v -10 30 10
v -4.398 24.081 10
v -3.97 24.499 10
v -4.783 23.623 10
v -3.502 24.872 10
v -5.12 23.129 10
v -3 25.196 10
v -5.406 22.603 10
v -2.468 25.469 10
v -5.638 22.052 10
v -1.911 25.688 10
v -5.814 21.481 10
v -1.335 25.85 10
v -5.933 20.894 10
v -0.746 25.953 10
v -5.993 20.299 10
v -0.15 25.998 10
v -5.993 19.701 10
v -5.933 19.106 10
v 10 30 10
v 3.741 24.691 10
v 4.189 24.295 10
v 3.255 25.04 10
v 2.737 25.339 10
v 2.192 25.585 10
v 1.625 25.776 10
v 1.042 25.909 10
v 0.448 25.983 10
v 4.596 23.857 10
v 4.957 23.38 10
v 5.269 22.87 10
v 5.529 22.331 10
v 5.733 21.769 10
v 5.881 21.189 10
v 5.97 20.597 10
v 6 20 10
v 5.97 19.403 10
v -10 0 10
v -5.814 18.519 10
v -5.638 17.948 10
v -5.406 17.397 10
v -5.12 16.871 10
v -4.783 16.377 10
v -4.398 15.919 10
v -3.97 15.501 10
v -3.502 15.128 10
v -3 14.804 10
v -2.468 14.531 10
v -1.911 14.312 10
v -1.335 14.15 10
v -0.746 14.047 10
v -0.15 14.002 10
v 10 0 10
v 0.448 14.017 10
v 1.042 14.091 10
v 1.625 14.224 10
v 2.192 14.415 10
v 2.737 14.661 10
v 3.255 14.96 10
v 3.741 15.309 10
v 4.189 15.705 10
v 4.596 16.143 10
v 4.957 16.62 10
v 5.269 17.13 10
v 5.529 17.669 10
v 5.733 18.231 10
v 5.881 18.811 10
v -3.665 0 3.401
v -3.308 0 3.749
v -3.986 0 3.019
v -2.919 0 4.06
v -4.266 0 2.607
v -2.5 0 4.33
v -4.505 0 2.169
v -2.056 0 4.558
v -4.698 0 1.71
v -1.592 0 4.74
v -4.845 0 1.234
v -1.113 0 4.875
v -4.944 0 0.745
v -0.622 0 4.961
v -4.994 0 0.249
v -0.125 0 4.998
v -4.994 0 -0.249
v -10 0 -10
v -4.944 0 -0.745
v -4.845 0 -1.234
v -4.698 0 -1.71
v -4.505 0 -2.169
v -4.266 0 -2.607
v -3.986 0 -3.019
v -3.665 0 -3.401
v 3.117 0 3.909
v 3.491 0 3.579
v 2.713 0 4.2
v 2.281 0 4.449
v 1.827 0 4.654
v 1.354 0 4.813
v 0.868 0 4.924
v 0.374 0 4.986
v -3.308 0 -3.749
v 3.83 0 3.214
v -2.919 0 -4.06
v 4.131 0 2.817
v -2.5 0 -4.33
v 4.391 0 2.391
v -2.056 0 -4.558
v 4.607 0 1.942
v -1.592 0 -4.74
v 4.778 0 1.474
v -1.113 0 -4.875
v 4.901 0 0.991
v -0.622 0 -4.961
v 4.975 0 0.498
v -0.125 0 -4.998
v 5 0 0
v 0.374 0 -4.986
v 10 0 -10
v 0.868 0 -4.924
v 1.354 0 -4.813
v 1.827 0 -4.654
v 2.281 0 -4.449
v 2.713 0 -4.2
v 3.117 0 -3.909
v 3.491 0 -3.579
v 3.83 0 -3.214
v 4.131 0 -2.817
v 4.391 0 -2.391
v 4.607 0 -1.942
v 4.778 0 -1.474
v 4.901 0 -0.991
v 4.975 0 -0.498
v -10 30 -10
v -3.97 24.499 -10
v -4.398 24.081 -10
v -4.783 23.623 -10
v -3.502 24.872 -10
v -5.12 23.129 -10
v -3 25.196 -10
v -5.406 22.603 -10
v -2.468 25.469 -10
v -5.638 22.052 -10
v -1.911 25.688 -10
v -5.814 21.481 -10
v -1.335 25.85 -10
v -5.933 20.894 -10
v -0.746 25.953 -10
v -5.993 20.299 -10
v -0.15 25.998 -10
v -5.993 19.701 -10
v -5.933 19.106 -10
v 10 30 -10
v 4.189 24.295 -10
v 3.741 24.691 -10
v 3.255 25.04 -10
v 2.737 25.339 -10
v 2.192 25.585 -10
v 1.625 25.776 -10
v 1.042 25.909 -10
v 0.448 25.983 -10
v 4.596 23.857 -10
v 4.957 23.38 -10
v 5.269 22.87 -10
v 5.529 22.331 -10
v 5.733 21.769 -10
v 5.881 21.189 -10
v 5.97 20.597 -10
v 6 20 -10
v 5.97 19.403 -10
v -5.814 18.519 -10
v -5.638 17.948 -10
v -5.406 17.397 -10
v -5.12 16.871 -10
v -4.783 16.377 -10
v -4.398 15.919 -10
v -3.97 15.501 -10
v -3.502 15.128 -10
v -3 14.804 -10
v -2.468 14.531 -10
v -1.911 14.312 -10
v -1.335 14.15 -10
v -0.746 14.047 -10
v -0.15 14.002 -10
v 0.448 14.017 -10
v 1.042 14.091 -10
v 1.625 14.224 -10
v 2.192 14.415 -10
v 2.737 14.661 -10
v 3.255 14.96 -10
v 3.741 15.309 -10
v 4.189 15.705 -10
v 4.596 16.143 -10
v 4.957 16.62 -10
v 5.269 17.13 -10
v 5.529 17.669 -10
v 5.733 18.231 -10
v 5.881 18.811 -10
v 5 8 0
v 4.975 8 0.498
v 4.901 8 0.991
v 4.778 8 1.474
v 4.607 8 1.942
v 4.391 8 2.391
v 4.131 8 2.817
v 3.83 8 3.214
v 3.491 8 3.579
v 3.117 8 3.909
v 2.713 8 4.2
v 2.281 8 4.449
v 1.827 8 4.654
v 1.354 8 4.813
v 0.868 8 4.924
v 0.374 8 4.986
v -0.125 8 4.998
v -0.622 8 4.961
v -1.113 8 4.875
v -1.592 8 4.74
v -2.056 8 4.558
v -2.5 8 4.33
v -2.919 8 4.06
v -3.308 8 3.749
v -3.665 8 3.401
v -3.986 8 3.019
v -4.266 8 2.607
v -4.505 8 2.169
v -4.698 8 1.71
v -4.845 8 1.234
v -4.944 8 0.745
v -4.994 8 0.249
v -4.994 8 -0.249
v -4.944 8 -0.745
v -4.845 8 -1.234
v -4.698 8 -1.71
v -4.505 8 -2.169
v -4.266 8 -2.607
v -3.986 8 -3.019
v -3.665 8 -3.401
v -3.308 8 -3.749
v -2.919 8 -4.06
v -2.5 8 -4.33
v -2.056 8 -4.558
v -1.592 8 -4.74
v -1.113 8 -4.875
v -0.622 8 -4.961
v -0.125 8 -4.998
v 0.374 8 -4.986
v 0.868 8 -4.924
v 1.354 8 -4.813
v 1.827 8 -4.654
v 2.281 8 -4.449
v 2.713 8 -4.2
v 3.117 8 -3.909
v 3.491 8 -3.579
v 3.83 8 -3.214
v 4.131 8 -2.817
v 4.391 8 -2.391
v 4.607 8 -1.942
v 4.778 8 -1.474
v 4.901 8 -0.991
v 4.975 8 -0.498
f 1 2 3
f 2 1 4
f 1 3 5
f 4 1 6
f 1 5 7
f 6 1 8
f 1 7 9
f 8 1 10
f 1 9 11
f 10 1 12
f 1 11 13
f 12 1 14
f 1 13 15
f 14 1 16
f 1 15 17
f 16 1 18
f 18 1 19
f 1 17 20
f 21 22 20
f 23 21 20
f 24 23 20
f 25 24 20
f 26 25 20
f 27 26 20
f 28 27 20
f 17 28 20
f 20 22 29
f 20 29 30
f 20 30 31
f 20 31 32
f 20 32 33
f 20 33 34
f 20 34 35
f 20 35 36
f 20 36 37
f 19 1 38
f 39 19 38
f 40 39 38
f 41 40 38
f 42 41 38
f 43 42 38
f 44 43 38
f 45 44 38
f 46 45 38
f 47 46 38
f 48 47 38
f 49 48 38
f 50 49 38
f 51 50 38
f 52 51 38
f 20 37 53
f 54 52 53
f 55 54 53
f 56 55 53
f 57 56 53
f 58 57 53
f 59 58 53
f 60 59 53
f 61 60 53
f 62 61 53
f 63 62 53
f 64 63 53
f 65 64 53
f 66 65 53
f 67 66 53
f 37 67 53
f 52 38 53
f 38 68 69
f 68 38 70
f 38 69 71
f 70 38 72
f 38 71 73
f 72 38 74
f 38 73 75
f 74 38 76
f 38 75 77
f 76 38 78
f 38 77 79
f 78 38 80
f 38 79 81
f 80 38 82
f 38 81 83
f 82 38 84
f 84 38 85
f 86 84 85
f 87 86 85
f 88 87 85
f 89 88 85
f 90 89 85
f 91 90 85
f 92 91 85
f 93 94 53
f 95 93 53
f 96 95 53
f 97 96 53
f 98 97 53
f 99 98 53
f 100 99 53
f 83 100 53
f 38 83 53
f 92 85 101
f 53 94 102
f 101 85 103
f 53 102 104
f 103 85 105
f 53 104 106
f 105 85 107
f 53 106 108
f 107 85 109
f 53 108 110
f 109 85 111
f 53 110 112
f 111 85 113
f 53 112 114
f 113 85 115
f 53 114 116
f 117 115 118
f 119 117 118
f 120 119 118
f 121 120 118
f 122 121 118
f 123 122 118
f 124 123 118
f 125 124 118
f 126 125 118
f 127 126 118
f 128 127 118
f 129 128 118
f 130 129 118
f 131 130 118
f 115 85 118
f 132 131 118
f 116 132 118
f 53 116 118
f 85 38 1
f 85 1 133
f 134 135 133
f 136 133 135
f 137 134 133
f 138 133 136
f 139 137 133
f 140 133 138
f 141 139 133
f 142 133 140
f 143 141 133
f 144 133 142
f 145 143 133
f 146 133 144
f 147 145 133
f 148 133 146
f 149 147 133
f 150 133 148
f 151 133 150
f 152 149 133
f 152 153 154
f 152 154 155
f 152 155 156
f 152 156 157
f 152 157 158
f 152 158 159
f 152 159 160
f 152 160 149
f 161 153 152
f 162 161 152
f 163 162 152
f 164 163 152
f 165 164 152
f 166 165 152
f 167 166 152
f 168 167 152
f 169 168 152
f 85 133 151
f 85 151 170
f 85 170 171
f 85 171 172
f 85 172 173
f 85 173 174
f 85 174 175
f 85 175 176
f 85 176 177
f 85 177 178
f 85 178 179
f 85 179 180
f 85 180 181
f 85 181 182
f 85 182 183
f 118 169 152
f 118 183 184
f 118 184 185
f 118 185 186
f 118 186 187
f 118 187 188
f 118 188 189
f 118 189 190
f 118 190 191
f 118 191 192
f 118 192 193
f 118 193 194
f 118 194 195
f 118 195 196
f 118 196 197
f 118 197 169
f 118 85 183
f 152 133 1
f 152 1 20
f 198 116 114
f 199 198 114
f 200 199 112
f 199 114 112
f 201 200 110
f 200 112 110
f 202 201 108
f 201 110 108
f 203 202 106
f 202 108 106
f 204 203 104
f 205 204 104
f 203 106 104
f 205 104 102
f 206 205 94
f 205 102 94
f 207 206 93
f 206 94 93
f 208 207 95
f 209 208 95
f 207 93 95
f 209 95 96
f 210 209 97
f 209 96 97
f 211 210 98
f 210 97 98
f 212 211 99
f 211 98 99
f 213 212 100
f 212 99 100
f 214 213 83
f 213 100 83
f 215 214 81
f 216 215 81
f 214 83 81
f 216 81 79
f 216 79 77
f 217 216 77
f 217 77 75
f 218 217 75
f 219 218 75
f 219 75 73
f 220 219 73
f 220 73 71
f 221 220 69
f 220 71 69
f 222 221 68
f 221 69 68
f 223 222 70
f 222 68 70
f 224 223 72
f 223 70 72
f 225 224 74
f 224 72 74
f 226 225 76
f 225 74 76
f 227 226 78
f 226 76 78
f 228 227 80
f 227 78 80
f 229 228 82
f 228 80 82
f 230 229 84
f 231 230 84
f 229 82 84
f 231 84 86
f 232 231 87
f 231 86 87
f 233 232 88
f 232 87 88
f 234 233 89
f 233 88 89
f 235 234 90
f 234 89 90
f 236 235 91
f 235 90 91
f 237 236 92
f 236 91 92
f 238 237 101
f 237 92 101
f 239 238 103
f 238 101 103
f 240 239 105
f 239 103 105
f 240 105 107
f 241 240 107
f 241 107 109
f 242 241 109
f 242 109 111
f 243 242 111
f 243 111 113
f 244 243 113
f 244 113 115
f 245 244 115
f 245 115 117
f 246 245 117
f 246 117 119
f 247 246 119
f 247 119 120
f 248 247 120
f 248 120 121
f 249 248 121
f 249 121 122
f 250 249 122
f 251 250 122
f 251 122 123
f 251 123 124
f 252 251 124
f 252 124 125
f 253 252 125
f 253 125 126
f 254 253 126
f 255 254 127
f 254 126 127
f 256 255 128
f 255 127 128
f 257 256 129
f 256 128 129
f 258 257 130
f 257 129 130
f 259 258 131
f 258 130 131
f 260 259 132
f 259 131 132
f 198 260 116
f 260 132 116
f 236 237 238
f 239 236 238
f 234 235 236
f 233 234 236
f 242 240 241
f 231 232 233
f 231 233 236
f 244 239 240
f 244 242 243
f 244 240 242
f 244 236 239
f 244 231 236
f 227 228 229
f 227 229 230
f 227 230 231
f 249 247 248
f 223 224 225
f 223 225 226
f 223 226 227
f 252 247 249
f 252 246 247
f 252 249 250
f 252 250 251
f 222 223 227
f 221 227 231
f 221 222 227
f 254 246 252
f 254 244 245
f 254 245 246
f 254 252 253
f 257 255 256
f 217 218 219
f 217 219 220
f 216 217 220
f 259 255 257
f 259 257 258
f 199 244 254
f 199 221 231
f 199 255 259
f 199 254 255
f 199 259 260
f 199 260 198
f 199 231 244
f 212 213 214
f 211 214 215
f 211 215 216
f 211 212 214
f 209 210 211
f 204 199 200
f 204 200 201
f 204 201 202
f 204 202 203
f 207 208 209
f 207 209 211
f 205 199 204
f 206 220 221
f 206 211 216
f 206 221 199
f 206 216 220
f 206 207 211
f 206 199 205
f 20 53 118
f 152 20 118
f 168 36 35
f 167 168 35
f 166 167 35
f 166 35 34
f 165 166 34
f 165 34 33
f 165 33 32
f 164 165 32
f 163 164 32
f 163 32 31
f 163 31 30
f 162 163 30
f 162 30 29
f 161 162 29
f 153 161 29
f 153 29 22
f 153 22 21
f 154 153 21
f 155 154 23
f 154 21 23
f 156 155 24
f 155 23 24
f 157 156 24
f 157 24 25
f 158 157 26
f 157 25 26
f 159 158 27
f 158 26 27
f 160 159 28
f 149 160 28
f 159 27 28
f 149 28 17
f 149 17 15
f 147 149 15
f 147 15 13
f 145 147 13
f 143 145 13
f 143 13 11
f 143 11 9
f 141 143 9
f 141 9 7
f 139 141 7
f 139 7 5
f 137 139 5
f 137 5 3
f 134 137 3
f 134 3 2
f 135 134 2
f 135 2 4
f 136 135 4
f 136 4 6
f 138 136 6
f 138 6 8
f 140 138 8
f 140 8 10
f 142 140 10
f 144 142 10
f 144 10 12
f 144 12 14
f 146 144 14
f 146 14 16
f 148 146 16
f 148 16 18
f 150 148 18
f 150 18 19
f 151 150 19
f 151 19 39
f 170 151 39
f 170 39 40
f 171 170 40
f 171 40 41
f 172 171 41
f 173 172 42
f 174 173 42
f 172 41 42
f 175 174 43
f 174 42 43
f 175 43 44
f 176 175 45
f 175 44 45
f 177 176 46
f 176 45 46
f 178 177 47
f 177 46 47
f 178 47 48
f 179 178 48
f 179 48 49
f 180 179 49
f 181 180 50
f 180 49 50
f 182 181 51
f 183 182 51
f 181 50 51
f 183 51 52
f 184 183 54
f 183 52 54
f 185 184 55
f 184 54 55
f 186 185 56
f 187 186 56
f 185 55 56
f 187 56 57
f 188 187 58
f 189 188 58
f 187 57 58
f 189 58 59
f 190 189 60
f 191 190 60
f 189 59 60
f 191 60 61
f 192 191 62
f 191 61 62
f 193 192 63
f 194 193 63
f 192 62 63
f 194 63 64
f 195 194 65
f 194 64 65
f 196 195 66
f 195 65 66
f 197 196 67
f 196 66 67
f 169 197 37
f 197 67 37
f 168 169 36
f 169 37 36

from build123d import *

# Parameters (mm, degrees)
SKETCH1_W           = 20
SKETCH1_H           = 20
BOSS_EXTRUDE2_DEPTH = 30
CUT_EXTRUDE1_REACH  = 22
SKETCH2_R           = 6
SKETCH3_R           = 5
CUT_EXTRUDE2_DEPTH  = 8


with BuildPart() as part:
    # Sketch1 → Boss-Extrude2 (new body)
    with BuildSketch(Plane(origin=(0, 0, 0), x_dir=(1, 0, 0), z_dir=(0, 1, 0))):
        Rectangle(SKETCH1_W, SKETCH1_H)
    extrude(amount=BOSS_EXTRUDE2_DEPTH)

    # Sketch2 → Cut-Extrude1 (cut, up to next)
    with BuildSketch(Plane.XY.offset(10), mode=Mode.PRIVATE) as cut_extrude1_sk1:
        with Locations((0, 20)):
            Circle(SKETCH2_R)
    cut_extrude1_tool1 = extrude(cut_extrude1_sk1.sketch, amount=-CUT_EXTRUDE1_REACH, mode=Mode.PRIVATE) & part.part
    add(cut_extrude1_tool1.solids().sort_by_distance((0, 20, 10))[0], mode=Mode.SUBTRACT)

    # Sketch3 → Cut-Extrude2 (cut)
    with BuildSketch(Plane.XZ):
        Circle(SKETCH3_R)
    extrude(amount=-CUT_EXTRUDE2_DEPTH, mode=Mode.SUBTRACT)


solid = part.part
